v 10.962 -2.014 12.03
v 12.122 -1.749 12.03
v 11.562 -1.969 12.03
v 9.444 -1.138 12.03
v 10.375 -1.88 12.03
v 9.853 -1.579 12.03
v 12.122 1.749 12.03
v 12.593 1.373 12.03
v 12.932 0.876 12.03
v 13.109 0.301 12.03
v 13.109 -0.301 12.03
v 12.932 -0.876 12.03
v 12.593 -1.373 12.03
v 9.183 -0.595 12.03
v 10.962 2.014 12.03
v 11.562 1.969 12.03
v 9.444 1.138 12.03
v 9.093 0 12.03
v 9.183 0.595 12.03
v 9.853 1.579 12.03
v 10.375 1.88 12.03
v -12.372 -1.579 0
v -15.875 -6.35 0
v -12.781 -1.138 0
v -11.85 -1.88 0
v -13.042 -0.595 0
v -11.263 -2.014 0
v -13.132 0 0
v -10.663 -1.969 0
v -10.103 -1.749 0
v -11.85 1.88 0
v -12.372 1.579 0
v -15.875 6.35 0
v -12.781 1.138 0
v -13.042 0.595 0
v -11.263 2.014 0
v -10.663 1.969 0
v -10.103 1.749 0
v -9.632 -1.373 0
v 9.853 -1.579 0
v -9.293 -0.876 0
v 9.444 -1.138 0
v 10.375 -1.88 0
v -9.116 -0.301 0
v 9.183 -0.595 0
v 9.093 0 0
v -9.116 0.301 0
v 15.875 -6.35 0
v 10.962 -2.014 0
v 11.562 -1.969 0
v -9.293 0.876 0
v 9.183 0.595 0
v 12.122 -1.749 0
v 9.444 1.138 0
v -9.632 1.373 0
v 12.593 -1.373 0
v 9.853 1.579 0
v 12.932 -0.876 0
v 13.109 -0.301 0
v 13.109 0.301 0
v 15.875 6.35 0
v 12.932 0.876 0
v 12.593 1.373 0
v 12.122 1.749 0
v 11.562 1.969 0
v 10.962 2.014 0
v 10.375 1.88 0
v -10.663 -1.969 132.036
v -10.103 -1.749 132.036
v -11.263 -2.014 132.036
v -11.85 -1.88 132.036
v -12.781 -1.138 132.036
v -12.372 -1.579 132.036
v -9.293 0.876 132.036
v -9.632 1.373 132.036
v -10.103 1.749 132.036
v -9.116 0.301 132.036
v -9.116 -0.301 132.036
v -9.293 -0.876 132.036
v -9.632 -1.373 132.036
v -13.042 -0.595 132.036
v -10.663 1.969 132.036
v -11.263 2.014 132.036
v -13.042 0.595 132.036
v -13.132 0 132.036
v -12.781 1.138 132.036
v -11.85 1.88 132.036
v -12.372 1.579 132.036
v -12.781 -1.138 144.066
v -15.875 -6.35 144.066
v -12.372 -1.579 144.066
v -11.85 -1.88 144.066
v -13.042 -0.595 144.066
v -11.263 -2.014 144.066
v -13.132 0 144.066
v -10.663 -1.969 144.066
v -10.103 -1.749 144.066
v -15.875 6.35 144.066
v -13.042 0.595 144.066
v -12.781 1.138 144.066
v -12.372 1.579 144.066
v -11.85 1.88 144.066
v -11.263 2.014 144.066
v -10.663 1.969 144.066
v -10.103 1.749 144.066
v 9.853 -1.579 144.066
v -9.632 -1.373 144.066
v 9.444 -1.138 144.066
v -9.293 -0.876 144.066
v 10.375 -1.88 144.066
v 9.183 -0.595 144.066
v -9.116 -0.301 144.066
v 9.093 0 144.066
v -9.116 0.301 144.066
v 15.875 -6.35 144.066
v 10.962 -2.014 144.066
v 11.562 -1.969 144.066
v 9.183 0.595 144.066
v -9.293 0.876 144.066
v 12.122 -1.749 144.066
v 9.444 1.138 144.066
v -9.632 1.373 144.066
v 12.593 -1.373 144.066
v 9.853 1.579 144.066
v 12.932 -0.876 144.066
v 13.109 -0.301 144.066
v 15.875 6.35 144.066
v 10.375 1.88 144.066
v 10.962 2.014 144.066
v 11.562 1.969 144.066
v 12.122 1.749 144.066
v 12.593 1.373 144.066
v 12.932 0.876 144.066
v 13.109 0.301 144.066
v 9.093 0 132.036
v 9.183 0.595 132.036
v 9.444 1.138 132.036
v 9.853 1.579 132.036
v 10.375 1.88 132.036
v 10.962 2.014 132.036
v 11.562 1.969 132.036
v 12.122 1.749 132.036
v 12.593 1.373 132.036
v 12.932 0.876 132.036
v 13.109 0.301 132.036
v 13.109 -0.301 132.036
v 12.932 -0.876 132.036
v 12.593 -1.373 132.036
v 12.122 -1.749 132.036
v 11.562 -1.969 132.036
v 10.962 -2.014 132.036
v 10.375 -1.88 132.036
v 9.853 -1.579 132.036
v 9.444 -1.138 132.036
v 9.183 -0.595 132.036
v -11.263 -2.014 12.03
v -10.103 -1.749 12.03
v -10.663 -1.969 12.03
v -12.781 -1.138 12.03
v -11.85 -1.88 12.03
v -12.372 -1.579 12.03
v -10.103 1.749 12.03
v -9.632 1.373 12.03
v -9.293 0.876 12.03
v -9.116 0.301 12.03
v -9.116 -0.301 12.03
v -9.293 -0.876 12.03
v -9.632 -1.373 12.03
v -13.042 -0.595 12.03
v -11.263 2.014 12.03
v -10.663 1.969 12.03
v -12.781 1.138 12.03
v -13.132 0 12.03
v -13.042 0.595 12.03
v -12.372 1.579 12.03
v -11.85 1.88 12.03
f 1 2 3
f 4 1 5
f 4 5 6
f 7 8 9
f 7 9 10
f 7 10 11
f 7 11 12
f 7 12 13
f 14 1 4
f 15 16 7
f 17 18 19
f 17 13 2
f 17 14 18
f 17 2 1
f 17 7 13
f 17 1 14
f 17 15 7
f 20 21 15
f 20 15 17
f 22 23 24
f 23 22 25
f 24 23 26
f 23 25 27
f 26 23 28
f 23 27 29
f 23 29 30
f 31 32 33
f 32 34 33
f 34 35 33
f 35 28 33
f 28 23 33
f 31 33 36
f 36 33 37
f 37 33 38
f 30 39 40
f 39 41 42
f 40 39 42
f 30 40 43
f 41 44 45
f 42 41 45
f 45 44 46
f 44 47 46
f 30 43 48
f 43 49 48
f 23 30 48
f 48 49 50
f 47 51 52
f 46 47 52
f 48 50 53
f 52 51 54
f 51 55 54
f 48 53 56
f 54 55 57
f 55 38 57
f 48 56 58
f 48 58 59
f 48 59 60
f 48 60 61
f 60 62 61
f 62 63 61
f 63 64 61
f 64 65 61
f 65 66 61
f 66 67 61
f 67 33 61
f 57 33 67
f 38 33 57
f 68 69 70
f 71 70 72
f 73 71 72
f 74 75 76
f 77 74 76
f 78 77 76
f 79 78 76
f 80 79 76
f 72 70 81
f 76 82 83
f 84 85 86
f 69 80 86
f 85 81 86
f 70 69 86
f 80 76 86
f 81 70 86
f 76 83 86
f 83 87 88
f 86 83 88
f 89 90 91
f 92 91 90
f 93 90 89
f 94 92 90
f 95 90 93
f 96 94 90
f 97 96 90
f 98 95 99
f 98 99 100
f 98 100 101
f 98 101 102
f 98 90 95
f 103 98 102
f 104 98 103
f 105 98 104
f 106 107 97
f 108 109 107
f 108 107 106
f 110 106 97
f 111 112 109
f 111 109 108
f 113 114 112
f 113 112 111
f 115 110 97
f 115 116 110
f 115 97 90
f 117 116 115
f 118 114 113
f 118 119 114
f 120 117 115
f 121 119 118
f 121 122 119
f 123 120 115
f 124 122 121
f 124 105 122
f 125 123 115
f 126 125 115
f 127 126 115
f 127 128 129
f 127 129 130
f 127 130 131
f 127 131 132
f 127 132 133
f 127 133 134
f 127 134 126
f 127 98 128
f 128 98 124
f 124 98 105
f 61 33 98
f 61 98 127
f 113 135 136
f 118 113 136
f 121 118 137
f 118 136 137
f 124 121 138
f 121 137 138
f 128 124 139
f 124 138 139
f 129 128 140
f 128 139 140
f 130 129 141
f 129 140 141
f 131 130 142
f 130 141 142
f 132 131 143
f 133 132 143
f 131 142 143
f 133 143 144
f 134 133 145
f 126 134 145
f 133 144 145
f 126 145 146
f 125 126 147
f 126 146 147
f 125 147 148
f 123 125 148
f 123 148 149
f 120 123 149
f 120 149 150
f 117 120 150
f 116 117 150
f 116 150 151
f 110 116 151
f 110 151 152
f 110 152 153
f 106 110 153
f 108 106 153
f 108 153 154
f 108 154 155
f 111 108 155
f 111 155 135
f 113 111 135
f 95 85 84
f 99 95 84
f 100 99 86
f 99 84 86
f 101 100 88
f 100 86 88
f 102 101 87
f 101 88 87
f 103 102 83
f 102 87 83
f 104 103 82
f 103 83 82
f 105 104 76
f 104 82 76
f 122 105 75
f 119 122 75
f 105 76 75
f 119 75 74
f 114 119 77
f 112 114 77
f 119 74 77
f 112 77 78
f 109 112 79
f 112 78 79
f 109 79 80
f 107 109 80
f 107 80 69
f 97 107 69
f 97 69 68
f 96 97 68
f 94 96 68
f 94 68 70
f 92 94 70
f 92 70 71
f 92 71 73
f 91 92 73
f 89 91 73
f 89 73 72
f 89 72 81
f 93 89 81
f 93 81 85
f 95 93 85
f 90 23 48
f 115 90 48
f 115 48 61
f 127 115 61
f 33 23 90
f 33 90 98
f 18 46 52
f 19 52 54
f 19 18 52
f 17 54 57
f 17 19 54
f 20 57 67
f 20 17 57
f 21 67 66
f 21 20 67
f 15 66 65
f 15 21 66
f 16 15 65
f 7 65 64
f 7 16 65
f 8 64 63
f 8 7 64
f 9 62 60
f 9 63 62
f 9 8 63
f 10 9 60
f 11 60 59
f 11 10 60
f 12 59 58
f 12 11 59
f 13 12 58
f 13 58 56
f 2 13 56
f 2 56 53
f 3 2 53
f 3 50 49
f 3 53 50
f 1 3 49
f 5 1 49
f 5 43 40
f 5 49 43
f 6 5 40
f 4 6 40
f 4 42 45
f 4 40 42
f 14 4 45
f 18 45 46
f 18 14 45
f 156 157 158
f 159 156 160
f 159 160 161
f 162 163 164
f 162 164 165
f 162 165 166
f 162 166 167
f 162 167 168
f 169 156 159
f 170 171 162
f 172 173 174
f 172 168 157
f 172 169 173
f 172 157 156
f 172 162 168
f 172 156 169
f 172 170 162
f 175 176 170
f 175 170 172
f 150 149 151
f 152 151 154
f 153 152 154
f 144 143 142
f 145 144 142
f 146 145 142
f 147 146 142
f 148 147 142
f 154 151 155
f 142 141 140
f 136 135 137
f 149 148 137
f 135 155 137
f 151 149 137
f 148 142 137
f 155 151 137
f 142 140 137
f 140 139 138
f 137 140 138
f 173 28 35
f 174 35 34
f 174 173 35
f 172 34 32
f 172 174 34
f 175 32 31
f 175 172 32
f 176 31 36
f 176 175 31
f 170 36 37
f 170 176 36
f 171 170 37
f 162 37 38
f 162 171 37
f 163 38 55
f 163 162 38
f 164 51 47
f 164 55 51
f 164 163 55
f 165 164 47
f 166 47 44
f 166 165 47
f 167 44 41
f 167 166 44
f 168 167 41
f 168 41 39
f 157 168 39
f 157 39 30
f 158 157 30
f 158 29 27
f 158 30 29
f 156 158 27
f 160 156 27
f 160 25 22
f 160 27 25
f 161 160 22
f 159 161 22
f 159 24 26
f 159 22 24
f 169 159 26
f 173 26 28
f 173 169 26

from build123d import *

# Parameters (mm, degrees)
SKETCH1_W                  = 31.75
SKETCH1_H                  = 12.7
BOSS_EXTRUDE1_DEPTH        = 144.065761159
F_10_32_TAPPED_HOLE1_D     = 4.0386
F_10_32_TAPPED_HOLE1_DEPTH = 12.03


with BuildPart() as part:
    # Sketch1 → Boss-Extrude1 (new body)
    with BuildSketch(Plane.XY):
        Rectangle(SKETCH1_W, SKETCH1_H)
    extrude(amount=BOSS_EXTRUDE1_DEPTH)

    # #10-32 Tapped Hole1
    with Locations(Plane(origin=(0, -9.125, 144.065761159), x_dir=(1, 0, 0), z_dir=(0, 0, 1))):
        with Locations((-11.1125, 9.125), (11.1125, 9.125)):
            f_10_32_tapped_hole1 = Hole(F_10_32_TAPPED_HOLE1_D / 2, depth=F_10_32_TAPPED_HOLE1_DEPTH)

    # Mirror1: #10-32 Tapped Hole1 across plane
    add(f_10_32_tapped_hole1.mirror(Plane.XY.offset(72.03288058)), mode=Mode.SUBTRACT)


solid = part.part
